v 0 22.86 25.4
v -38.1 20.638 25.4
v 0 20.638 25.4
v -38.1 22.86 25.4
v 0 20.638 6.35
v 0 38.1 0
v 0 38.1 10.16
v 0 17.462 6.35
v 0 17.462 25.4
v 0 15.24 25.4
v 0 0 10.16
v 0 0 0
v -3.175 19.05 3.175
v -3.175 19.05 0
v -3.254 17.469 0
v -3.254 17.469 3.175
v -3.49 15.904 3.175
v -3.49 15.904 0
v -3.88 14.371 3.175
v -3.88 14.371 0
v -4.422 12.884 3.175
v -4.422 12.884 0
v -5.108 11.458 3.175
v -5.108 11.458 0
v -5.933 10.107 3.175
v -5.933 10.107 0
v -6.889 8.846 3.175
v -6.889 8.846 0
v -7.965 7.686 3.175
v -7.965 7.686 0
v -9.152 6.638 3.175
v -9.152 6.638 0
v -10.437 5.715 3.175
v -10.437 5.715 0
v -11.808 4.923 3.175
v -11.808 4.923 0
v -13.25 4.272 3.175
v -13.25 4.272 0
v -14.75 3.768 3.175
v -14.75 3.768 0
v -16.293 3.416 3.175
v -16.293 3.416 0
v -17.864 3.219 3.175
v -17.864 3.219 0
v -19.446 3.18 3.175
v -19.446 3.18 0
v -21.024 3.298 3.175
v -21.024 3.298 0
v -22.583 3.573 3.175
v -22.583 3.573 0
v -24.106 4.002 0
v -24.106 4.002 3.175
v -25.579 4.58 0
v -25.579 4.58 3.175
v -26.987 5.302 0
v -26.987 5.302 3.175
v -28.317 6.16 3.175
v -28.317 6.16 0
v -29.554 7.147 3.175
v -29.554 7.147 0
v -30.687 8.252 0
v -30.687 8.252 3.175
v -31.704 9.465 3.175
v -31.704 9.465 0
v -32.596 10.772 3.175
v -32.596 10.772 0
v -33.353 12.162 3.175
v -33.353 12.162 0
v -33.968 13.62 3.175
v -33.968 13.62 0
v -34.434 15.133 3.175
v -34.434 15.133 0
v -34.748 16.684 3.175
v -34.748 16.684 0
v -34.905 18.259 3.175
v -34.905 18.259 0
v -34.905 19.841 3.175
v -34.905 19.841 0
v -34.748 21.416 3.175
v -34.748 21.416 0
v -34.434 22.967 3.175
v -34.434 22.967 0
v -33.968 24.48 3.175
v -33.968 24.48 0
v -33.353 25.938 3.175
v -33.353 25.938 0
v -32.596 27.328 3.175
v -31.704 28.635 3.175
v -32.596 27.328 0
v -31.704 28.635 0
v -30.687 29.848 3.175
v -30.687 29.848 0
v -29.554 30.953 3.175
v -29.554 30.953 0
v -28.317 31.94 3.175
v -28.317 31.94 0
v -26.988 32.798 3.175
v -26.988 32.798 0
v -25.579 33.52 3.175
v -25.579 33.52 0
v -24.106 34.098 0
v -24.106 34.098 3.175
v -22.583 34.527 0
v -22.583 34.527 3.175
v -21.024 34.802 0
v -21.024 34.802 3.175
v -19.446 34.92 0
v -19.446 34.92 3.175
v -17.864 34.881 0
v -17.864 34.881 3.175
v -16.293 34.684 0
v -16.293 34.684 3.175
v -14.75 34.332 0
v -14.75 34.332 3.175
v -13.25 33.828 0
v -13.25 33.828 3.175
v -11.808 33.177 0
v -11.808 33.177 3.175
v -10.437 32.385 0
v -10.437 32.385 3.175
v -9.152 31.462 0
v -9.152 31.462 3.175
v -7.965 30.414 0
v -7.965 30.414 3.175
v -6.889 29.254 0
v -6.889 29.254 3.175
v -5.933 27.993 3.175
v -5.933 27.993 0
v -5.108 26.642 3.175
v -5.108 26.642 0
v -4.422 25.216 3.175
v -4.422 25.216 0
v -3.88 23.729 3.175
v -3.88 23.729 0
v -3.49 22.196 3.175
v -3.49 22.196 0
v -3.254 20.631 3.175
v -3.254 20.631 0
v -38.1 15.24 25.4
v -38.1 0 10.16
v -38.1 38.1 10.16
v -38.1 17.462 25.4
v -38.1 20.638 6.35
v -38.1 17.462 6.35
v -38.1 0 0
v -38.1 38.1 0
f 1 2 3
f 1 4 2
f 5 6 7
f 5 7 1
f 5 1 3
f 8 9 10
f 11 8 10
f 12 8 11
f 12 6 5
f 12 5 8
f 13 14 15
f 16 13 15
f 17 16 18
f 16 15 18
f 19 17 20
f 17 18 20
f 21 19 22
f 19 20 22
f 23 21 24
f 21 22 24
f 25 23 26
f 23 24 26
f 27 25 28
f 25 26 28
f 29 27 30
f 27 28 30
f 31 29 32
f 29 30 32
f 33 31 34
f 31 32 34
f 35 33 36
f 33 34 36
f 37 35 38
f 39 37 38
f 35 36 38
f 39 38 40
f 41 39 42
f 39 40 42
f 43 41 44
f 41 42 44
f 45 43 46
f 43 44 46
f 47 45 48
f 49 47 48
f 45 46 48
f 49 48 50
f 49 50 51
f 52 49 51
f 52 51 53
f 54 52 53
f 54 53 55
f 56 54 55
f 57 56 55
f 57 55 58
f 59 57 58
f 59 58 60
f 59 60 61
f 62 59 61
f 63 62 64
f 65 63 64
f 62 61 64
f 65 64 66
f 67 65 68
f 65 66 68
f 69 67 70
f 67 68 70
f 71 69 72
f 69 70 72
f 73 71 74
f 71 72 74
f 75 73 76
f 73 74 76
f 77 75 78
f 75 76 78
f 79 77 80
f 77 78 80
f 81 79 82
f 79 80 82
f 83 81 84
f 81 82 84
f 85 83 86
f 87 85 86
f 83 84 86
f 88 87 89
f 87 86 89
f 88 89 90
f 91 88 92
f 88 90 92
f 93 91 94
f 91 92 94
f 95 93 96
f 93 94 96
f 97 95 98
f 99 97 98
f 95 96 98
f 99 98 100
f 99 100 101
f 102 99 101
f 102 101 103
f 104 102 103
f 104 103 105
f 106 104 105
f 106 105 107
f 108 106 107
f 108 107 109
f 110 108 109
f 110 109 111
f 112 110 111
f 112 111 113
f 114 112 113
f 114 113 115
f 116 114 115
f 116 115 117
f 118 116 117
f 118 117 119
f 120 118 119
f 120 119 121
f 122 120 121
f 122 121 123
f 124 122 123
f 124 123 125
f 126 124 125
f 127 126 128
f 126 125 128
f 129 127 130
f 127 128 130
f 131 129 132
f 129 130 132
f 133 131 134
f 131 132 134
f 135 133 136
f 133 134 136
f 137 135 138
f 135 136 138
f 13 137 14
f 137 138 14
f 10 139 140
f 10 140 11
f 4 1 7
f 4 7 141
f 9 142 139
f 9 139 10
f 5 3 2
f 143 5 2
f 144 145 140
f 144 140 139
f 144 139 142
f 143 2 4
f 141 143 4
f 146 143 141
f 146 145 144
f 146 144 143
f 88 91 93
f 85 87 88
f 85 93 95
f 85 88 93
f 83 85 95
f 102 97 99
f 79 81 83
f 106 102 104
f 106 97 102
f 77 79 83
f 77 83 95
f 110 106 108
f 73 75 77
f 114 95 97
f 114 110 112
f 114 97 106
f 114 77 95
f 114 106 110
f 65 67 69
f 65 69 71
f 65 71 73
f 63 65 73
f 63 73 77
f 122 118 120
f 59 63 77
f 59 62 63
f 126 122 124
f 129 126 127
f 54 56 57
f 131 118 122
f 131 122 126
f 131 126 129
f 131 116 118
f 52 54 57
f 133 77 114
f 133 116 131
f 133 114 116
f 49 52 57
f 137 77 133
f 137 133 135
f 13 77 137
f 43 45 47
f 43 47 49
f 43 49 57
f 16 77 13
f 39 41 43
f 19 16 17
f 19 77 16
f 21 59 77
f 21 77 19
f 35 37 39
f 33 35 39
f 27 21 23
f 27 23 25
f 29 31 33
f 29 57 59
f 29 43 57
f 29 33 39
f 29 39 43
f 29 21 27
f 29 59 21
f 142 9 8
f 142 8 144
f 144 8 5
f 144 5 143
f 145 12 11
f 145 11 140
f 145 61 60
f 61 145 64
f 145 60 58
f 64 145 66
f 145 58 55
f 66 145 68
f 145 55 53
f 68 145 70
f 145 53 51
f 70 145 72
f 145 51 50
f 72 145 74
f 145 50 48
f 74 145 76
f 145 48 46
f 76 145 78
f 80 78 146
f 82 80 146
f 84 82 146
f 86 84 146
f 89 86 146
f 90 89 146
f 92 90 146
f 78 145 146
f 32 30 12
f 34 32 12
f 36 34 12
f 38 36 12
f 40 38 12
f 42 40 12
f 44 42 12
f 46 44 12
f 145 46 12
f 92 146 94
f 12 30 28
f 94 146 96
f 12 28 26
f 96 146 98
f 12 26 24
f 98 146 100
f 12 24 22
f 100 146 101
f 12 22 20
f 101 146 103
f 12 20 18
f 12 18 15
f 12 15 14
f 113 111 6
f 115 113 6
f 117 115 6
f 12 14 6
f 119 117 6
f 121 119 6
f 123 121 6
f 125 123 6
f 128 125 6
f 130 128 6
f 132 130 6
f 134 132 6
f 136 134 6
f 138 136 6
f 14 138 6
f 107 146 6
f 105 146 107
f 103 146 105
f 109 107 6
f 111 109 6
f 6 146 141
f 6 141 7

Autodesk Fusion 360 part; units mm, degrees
sketch "Sketch1" plane through (0, 0, 0) normal (0, 0, 1) x (1, 0, 0)
  line L0 (0, 0) -> (-38.1, 0)
  line L1 (-38.1, 0) -> (-38.1, 38.1)
  line L2 (-38.1, 38.1) -> (0, 38.1)
  line L3 (0, 38.1) -> (0, 0)
  dimension "d1" = 38.1
  dimension "d2" = 38.1
extrude "Extrude1" add sketch "Sketch1" along normal blind 25.4
chamfer "Chamfer1" distance 15.24 angle 45 2 edges at (-19.05, 0, 25.4) (-19.05, 38.1, 25.4)
sketch "Sketch2" plane through (0, 0, 25.4) normal (0, 0, 1) x (-1, 0, 0)
  line L0 (0, -22.86) -> (38.1, -22.86)
  line L1 (38.1, -22.86) -> (38.1, -15.24)
  line L2 (38.1, -15.24) -> (0, -15.24)
  line L3 (0, -15.24) -> (0, -22.86)
  line L4 (38.1, -19.05) -> (0, -19.05)
  line L5 (0, -19.05) -> (0, -20.6375)
  line L6 (0, -20.6375) -> (38.1, -20.6375)
  line L7 (38.1, -20.6375) -> (38.1, -19.05)
  line L8 (38.1, -19.05) -> (0, -19.05)
  line L9 (0, -19.05) -> (0, -17.4625)
  line L10 (0, -17.4625) -> (38.1, -17.4625)
  line L11 (38.1, -17.4625) -> (38.1, -19.05)
  dimension "d6" = 1.5875
  dimension "d7" = 1.5875
extrude "Extrude2" cut sketch "Sketch2" against normal blind 19.05 contours L1 L3 L4 L5 L6 L7 L8 | L1 L3 L4 L8 L9 L10 L11
sketch "Sketch3" plane through (0, 0, 0) normal (0, 0, -1) x (1, 0, 0)
  line L0 (-38.1, -38.1) -> (0, -38.1)
  line L1 (0, -38.1) -> (0, 0)
  line L2 (0, 0) -> (-38.1, 0)
  line L3 (-38.1, 0) -> (-38.1, -38.1)
  circle A0 centre (-19.05, -19.05) radius 15.875
  dimension "d10" = 31.75
extrude "Extrude3" cut sketch "Sketch3" against normal blind 3.175 contours A0
